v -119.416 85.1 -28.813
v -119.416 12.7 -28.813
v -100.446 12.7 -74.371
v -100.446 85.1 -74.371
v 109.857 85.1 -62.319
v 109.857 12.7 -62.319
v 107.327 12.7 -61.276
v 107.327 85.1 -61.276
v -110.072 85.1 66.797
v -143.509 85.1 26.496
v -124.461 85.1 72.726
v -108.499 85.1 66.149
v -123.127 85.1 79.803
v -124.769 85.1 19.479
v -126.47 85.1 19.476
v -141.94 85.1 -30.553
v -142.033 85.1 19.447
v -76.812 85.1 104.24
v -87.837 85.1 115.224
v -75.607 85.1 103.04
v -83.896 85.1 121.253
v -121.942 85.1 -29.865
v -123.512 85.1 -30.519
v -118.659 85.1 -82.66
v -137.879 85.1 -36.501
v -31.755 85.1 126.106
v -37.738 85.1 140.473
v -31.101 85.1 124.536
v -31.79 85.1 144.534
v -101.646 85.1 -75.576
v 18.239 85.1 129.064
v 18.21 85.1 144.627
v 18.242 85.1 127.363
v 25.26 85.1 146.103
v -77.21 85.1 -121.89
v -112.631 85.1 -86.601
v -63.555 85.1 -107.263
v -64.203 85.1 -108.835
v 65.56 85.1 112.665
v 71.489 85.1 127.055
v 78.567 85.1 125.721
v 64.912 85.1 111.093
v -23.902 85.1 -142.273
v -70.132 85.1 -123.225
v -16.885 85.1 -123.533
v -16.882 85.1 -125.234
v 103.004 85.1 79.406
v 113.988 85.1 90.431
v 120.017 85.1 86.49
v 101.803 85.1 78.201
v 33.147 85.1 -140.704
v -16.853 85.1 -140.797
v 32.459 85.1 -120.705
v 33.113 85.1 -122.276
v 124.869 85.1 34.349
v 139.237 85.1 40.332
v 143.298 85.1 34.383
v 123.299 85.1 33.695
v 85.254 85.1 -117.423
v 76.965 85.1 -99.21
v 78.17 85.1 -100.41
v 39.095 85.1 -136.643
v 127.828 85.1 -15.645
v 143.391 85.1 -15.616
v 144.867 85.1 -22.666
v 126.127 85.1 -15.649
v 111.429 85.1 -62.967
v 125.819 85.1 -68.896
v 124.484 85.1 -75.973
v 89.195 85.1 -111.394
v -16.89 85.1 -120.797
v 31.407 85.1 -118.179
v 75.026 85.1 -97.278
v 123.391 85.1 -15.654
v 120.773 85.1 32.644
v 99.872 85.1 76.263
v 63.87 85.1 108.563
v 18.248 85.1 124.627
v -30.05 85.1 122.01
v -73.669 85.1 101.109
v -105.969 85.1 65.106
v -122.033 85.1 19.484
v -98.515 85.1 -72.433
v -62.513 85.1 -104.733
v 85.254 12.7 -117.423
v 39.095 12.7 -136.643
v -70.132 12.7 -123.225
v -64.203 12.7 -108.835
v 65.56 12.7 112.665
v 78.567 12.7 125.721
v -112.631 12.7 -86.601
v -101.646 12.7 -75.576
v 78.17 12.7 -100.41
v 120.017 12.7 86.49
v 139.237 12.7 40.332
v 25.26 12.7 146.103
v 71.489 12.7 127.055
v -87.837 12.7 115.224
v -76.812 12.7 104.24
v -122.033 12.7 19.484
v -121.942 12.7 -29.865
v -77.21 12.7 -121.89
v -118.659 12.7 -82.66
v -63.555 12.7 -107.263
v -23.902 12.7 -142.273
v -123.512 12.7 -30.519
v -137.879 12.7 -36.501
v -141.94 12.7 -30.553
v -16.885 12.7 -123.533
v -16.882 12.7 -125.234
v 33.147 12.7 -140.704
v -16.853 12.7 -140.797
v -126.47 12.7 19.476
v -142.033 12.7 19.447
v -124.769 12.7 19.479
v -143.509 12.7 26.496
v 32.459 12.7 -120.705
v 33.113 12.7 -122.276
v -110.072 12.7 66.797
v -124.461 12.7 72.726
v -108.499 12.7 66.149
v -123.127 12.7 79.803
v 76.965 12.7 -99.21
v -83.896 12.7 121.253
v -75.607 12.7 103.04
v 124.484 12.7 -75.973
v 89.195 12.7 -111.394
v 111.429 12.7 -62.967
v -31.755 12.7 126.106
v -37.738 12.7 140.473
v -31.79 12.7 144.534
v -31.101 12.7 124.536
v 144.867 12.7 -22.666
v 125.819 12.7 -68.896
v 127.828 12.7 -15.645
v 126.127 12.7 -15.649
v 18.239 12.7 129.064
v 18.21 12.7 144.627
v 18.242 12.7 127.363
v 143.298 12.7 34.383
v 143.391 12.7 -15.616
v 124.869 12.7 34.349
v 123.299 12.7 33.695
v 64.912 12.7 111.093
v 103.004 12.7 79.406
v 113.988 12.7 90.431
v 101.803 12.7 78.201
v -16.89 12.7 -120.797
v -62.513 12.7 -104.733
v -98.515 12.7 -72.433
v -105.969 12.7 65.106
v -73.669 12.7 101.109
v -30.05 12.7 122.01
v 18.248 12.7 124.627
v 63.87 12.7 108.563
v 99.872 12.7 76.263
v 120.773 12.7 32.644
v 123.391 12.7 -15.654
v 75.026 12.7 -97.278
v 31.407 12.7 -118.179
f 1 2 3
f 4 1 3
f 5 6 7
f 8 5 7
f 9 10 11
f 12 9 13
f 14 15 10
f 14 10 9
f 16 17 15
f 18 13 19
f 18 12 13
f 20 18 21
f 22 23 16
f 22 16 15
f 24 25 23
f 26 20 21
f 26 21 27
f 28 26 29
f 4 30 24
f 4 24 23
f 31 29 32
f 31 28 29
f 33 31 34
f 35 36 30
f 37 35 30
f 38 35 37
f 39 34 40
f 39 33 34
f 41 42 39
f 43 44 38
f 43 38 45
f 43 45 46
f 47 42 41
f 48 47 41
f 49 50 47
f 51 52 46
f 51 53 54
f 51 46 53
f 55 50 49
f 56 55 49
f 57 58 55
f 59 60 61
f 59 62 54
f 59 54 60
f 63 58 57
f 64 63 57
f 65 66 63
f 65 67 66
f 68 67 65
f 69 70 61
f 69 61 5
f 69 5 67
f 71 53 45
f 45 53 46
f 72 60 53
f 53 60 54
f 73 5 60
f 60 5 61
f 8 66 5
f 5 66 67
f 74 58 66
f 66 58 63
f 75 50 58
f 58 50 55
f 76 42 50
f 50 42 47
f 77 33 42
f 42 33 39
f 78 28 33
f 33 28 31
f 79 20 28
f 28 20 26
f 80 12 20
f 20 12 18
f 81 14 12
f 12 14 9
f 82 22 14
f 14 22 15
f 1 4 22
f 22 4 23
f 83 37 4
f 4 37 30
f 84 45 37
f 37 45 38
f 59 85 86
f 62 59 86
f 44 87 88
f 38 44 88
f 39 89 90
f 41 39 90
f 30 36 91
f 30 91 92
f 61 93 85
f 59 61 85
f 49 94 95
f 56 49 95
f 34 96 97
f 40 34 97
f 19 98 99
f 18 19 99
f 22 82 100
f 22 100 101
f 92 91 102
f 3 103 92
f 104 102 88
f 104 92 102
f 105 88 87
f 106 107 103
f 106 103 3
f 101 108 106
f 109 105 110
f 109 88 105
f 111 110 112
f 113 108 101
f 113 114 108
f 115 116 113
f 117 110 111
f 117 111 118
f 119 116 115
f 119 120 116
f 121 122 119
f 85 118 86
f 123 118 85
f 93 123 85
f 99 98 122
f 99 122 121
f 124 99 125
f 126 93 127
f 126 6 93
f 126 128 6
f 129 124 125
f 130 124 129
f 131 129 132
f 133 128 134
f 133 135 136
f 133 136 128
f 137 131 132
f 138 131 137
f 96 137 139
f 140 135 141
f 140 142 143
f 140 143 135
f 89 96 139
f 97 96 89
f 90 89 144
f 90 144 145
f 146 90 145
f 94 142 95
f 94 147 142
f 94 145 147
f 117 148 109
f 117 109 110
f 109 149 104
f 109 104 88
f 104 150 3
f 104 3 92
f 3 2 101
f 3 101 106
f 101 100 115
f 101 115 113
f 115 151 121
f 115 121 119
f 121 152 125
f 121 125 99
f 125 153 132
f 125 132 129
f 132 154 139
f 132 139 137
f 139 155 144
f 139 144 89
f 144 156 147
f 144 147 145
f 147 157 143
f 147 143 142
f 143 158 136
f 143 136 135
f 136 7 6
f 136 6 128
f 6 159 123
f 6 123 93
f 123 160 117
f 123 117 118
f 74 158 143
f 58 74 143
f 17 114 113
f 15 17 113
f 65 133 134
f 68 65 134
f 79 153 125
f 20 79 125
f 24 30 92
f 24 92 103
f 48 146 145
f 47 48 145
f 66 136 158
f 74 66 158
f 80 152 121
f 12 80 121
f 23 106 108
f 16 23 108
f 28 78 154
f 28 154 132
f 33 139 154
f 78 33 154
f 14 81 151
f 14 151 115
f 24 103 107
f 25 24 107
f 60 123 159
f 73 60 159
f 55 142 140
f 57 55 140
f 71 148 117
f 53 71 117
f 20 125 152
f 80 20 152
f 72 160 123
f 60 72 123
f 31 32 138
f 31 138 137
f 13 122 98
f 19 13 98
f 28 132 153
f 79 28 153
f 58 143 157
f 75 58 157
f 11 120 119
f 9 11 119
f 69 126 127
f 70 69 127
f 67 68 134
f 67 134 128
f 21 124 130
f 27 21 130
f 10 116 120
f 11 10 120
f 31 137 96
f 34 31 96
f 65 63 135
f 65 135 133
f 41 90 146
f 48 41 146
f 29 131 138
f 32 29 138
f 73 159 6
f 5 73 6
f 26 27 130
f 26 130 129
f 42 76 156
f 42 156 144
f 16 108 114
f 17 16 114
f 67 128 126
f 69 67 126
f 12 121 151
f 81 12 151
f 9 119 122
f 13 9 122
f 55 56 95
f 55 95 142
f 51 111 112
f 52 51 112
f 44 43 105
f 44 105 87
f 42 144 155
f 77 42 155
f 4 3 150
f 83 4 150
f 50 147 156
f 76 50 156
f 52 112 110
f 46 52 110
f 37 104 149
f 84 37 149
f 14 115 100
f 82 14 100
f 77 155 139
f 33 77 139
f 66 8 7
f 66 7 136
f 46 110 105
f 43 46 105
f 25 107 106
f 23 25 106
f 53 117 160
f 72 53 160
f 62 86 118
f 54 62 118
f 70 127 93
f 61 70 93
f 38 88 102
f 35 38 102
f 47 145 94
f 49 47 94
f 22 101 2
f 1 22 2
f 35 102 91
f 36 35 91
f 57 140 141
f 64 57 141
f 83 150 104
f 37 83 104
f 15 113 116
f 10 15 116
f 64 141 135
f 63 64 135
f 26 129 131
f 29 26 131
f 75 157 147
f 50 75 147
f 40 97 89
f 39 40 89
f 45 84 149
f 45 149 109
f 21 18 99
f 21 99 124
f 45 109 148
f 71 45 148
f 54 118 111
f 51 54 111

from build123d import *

# Parameters (mm, degrees)
SKETCH1_R           = 140.65
BOSS_EXTRUDE1_DEPTH = 12.7
BOSS_EXTRUDE2_DEPTH = 72.4
CIRPATTERN1_COUNT   = 16
SKETCH4_R           = 140.65
CUT_EXTRUDE1_DEPTH  = 12.7


with BuildPart() as part:
    # Sketch1 → Boss-Extrude1 (new body)
    with BuildSketch(Plane(origin=(0, 0, 0), x_dir=(1, 0, 0), z_dir=(0, 1, 0))):
        with Locations(Location((0, 0, 0), (0, 0, 270))):
            Circle(SKETCH1_R)
    extrude(amount=BOSS_EXTRUDE1_DEPTH)

    # Sketch3 → Boss-Extrude2 (add)
    with BuildSketch(Plane(origin=(0, 12.7, 0), x_dir=(1, 0, 0), z_dir=(0, 1, 0))):
        Polygon((-62.512510333, 104.73288314), (-16.28303914, 123.781137474), (-23.902340873, 142.272925951), (-70.131812067, 123.224671617), align=None)
    boss_extrude2 = extrude(amount=BOSS_EXTRUDE2_DEPTH)

    # CirPattern1: Boss-Extrude2 ×16 about axis
    cirpattern1_axis = Axis((0.678796416, 0, 1.91510031), (0, 1, 0))
    for i in range(1, CIRPATTERN1_COUNT):
        add(boss_extrude2.rotate(cirpattern1_axis, i * 360 / CIRPATTERN1_COUNT))

    # Sketch4 → Cut-Extrude1 (cut)
    with BuildSketch(Plane.XZ):
        Circle(SKETCH4_R)
    extrude(amount=-CUT_EXTRUDE1_DEPTH, mode=Mode.SUBTRACT)


solid = part.part
